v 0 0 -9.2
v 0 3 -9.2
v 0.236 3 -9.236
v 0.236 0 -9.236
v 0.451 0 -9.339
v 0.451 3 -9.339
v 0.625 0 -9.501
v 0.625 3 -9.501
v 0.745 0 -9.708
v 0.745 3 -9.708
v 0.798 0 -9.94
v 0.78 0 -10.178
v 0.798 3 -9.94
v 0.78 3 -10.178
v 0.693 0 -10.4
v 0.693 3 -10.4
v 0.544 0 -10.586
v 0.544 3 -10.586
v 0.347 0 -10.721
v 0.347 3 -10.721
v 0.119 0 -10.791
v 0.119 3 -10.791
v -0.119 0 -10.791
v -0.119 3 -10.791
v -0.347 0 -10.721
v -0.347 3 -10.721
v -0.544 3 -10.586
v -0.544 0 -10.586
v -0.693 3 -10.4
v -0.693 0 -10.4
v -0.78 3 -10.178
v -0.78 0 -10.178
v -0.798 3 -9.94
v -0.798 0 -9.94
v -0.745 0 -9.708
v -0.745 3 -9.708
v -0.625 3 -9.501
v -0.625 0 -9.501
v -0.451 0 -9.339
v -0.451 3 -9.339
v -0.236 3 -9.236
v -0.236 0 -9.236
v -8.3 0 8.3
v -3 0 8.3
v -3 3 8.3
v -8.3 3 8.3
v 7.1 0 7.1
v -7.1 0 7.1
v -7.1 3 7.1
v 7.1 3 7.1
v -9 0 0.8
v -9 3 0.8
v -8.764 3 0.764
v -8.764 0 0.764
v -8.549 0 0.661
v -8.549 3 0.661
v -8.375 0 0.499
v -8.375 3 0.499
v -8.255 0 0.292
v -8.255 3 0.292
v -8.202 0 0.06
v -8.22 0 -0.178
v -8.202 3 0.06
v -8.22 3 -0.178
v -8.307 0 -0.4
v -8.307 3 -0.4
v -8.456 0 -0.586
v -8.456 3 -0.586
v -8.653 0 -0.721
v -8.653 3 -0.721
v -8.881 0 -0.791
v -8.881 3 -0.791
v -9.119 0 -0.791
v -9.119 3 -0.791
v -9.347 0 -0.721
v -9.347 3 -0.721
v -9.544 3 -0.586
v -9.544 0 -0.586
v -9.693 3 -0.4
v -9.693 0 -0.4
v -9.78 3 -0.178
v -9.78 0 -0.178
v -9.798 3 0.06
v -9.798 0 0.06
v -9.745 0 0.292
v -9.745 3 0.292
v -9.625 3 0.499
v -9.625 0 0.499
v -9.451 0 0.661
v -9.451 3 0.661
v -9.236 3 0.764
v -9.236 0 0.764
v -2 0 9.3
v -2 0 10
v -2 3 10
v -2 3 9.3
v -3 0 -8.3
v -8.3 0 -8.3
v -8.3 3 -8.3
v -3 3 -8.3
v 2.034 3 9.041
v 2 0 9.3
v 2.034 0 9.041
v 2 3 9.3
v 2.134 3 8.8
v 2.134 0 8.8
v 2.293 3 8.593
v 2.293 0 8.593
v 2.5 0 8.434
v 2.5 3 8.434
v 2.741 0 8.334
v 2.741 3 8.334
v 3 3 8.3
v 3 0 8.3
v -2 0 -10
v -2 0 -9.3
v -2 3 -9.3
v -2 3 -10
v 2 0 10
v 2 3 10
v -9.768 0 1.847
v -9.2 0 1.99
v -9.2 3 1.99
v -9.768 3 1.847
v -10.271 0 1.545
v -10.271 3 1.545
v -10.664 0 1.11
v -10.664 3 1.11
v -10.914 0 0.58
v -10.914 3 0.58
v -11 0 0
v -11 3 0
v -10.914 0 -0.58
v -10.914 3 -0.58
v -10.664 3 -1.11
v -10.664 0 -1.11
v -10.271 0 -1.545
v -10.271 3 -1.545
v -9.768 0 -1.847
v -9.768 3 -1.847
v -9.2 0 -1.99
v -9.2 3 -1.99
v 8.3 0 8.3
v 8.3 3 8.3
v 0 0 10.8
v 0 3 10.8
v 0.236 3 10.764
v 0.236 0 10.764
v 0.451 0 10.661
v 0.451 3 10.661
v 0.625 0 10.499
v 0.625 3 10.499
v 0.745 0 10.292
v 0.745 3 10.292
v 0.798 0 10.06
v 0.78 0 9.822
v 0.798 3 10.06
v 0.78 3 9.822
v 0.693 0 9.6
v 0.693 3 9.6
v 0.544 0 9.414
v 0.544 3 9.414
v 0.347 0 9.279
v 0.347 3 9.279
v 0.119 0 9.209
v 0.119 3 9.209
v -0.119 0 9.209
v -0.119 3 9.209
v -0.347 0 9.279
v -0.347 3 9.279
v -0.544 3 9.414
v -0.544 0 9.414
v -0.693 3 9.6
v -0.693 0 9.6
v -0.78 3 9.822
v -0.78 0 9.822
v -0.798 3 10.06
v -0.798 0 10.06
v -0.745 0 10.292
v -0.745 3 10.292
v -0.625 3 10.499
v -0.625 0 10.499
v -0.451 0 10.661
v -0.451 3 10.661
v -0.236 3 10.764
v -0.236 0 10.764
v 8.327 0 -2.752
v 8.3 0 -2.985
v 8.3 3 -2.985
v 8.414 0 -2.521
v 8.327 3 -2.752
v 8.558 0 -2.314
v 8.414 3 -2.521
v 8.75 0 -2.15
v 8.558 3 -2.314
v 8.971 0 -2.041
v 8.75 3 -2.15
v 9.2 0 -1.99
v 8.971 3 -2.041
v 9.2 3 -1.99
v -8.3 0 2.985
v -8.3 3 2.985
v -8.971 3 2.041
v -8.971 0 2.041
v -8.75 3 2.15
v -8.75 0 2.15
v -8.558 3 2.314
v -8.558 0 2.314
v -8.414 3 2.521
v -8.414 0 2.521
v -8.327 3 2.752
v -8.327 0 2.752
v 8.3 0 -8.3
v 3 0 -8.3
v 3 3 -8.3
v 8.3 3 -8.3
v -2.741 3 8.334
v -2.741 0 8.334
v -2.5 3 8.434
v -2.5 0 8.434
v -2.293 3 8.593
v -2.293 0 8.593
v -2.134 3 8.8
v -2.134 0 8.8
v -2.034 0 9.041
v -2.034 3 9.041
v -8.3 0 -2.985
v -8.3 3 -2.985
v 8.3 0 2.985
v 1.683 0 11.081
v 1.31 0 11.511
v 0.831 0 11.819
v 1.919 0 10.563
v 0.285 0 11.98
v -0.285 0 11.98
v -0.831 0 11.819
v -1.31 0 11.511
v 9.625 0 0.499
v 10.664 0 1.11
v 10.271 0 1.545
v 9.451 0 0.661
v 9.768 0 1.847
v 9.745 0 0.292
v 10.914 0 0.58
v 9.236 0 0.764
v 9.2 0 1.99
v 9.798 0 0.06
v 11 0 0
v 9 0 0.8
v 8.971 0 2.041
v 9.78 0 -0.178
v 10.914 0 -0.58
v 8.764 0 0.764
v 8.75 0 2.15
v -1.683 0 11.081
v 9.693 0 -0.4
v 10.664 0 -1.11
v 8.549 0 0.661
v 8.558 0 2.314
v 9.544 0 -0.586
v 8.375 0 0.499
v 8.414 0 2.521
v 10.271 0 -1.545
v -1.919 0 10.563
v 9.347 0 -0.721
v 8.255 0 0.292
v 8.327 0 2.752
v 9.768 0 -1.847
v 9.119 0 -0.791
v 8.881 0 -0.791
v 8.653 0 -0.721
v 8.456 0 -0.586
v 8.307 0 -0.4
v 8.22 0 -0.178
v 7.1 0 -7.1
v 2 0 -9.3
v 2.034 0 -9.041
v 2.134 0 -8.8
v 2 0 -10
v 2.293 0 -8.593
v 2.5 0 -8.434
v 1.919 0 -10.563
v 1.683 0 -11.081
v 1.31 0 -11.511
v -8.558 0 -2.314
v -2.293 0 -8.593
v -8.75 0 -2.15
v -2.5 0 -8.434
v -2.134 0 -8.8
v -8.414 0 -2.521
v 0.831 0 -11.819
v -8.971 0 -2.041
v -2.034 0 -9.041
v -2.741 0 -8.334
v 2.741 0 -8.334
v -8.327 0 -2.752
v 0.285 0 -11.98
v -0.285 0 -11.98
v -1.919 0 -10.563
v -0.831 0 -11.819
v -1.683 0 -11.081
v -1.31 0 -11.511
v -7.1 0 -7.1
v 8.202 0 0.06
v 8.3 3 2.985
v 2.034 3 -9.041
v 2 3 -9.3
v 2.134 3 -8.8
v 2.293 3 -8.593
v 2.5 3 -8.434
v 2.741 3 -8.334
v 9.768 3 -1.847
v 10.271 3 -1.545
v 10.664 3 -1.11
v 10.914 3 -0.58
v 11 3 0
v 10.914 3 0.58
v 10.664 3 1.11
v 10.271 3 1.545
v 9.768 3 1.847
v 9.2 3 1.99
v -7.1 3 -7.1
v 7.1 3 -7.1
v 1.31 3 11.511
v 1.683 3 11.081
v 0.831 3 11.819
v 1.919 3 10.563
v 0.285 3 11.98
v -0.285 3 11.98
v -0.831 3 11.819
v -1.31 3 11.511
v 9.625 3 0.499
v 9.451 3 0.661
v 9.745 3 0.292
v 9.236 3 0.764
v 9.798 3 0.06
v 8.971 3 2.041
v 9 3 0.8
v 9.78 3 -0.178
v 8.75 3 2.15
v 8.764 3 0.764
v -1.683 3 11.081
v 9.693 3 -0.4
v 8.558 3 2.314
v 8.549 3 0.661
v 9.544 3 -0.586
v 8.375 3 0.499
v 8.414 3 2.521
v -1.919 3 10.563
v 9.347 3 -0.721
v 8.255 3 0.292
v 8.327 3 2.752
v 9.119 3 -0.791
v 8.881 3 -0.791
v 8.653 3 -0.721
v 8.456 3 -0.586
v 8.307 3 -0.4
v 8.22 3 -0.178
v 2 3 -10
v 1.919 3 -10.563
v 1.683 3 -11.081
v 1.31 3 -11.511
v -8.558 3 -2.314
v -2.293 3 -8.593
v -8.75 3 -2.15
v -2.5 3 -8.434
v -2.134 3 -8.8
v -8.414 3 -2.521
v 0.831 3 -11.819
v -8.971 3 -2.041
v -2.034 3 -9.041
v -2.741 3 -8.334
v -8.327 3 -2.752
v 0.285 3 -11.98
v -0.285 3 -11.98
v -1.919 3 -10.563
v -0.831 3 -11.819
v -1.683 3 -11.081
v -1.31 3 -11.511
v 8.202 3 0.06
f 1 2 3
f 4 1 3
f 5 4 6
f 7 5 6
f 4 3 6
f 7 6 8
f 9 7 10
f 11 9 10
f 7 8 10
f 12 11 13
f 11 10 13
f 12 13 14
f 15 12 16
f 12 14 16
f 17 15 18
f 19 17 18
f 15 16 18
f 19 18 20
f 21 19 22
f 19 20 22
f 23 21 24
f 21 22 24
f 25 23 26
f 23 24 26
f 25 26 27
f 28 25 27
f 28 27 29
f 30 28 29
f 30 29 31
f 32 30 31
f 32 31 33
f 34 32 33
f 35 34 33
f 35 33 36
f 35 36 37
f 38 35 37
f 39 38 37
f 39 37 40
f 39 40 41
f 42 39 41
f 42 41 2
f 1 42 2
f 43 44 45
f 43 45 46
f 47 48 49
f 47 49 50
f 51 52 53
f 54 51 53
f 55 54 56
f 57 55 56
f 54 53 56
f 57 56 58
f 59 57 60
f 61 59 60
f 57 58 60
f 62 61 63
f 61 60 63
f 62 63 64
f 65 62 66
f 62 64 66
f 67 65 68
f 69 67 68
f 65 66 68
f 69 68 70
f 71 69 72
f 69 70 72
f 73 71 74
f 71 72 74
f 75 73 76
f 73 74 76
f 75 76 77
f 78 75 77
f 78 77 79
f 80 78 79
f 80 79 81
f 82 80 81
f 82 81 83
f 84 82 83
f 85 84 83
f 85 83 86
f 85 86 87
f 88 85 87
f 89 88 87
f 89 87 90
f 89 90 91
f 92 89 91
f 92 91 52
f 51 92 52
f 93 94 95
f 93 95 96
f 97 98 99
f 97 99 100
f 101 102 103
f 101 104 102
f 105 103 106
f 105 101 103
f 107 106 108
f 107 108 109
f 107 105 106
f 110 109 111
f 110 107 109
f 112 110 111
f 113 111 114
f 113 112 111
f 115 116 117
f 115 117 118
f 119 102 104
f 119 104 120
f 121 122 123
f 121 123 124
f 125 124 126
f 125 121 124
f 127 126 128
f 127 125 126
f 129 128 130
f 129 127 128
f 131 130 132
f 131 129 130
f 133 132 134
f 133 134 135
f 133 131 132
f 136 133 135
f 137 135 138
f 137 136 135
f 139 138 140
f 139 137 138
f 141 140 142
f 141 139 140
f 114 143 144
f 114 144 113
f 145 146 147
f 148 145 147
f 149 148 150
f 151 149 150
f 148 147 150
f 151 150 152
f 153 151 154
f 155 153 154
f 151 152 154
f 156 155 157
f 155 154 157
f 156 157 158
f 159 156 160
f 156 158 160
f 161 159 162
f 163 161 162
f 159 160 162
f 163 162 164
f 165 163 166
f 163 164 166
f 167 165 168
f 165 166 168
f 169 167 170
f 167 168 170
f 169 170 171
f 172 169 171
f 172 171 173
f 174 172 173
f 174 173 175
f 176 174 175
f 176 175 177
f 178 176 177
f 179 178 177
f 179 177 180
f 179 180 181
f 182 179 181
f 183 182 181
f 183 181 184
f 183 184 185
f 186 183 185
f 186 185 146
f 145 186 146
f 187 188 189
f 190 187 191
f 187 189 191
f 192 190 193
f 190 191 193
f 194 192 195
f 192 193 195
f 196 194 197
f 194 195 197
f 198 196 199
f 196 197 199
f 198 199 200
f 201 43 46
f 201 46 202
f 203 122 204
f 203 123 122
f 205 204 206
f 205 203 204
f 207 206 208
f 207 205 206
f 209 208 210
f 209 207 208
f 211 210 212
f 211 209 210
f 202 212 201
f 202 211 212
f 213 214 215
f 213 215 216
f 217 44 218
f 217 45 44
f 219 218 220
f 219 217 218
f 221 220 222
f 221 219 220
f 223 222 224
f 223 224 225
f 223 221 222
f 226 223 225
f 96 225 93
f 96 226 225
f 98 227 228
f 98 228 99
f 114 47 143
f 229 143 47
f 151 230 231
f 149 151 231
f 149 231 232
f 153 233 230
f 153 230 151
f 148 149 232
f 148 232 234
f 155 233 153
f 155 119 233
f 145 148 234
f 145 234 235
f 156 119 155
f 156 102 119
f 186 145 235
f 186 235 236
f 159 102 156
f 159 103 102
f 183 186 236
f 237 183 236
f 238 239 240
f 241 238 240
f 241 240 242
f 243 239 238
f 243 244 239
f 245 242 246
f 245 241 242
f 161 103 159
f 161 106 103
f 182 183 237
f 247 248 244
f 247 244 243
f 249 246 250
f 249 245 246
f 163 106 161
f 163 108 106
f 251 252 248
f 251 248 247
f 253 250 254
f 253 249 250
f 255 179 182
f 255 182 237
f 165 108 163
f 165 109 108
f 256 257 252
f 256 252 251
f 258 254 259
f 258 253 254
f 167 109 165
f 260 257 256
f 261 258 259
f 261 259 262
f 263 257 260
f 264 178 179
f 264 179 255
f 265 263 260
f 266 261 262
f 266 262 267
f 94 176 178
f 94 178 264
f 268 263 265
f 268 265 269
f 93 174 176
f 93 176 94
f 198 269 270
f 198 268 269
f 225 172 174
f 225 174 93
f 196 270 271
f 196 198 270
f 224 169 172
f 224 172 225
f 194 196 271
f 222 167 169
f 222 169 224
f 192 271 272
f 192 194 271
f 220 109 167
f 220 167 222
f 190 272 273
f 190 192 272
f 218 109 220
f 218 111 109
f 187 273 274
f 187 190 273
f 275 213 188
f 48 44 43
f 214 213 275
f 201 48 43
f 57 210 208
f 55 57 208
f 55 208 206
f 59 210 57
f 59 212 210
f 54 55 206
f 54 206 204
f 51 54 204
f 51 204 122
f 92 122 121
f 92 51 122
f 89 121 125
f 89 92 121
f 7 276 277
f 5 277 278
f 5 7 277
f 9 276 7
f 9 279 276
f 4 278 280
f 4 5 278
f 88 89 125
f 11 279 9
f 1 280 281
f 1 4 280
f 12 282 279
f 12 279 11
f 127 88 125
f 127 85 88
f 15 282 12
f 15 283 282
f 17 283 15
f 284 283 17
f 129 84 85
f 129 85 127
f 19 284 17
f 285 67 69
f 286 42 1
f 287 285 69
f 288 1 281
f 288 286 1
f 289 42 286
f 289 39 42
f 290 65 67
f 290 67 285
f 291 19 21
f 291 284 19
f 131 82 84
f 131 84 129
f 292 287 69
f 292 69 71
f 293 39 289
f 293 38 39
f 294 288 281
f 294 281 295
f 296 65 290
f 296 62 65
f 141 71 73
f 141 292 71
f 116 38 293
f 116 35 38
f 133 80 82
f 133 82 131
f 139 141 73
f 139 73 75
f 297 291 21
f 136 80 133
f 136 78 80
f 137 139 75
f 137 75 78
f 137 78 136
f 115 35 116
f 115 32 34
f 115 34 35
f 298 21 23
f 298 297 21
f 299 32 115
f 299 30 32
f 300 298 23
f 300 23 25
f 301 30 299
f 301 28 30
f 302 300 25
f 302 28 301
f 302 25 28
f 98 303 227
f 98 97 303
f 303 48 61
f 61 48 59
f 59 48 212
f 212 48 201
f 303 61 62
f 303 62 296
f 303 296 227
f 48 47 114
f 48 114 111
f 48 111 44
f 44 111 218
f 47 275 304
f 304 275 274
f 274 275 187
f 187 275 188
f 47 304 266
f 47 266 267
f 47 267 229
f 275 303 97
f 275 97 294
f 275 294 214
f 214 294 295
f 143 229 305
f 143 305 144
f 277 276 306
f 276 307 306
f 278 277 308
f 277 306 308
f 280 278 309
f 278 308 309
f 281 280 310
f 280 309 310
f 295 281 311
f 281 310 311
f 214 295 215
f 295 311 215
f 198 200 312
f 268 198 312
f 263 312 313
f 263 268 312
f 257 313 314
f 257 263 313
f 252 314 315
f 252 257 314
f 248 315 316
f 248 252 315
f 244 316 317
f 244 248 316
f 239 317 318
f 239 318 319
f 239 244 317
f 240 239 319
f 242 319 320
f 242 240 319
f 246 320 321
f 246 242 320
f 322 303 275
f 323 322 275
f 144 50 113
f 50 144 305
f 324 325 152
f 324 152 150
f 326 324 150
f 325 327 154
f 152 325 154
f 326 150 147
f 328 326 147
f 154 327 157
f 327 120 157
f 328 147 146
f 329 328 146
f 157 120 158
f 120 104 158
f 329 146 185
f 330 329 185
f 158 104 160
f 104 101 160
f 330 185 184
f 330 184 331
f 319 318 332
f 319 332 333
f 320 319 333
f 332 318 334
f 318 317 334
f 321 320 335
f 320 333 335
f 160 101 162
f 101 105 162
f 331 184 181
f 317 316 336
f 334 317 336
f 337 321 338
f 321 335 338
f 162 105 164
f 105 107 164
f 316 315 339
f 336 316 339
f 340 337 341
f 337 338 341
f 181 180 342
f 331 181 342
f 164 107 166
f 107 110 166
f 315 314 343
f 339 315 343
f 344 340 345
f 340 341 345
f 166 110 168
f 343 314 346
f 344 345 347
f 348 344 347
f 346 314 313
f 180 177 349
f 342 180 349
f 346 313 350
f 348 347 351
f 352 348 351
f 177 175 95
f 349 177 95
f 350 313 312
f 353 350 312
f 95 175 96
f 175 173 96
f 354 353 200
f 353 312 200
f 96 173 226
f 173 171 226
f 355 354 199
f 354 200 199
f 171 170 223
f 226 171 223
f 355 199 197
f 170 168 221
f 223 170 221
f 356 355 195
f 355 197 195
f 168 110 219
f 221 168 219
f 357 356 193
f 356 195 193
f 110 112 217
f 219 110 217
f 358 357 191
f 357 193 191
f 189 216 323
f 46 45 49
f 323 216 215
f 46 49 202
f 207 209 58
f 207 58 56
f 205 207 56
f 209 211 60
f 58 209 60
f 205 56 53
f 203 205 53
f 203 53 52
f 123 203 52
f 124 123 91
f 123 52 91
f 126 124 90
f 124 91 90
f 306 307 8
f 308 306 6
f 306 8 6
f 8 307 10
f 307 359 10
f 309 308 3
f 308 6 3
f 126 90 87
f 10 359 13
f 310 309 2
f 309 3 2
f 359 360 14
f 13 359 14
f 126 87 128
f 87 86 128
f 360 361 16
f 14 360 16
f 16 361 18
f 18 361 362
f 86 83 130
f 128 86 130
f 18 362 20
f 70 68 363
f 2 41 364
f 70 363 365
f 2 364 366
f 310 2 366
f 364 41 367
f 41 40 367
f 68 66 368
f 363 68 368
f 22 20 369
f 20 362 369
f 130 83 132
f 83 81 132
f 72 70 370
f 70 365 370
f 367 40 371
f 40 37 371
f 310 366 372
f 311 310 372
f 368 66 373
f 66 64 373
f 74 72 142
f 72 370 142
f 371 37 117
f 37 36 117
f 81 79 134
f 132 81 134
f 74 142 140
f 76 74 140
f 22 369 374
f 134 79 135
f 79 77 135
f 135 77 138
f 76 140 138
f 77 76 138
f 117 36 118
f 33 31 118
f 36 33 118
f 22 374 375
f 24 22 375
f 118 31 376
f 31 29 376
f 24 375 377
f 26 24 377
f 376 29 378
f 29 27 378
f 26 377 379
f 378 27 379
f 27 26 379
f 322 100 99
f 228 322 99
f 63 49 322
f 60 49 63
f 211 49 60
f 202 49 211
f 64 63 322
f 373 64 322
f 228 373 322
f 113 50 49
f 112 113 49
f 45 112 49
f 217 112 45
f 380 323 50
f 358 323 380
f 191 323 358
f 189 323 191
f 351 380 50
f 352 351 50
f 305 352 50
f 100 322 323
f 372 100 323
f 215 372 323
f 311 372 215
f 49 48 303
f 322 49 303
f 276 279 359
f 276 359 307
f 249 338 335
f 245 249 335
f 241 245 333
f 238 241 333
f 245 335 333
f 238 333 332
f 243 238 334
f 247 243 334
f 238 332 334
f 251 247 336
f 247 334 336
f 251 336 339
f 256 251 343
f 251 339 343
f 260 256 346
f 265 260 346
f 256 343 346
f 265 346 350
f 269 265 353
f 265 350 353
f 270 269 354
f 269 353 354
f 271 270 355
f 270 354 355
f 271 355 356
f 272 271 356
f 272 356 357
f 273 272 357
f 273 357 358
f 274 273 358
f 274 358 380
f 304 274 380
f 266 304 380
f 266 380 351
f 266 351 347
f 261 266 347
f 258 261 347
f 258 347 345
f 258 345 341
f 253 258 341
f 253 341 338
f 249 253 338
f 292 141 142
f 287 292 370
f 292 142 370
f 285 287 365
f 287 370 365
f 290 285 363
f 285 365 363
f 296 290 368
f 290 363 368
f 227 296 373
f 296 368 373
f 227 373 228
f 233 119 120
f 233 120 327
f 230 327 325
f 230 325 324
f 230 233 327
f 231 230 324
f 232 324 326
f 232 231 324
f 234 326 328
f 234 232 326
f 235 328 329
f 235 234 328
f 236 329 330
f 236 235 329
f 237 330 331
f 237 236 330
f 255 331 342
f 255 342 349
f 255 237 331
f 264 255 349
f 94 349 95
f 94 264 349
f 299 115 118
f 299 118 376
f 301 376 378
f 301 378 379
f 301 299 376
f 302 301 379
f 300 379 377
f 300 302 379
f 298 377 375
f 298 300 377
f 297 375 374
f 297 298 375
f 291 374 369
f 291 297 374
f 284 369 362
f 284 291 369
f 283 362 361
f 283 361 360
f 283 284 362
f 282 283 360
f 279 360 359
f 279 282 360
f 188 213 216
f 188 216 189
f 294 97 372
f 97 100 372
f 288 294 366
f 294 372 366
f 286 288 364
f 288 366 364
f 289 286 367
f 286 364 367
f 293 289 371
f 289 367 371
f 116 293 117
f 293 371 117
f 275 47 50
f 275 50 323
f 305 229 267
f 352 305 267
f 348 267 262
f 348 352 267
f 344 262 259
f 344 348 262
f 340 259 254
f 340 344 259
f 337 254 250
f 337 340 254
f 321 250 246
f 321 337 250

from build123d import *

# Parameters (mm, degrees)
SKETCH1_W           = 14.2
SKETCH1_H           = 14.2
BOSS_EXTRUDE1_DEPTH = 3
SKETCH2_R           = 0.8
CUT_EXTRUDE1_DEPTH  = 17.552945357
FILLET1_R           = 1


with BuildPart() as part:
    # Sketch1 → Boss-Extrude1 (new body)
    with BuildSketch(Plane(origin=(0, 0, 0), x_dir=(1, 0, 0), z_dir=(0, 1, 0))):
        with BuildLine():
            Line((-9, 2), (-8.3, 2))
            Line((-8.3, 2), (-8.3, 8.3))
            Line((-8.3, 8.3), (-2, 8.3))
            Line((-2, 8.3), (-2, 10))
            ThreePointArc((-2, 10), (0, 12), (2, 10))
            Line((2, 10), (2, 8.3))
            Line((2, 8.3), (8.3, 8.3))
            Line((8.3, 8.3), (8.3, 2))
            Line((8.3, 2), (9, 2))
            ThreePointArc((9, 2), (11, 0), (9, -2))
            Line((9, -2), (8.3, -2))
            Line((8.3, -2), (8.3, -8.3))
            Line((8.3, -8.3), (2, -8.3))
            Line((2, -8.3), (2, -10))
            ThreePointArc((2, -10), (0, -12), (-2, -10))
            Line((-2, -10), (-2, -8.3))
            Line((-2, -8.3), (-8.3, -8.3))
            Line((-8.3, -8.3), (-8.3, -2))
            Line((-8.3, -2), (-9, -2))
            ThreePointArc((-9, -2), (-11, 0), (-9, 2))
        make_face()
        Rectangle(SKETCH1_W, SKETCH1_H, mode=Mode.SUBTRACT)
    extrude(amount=BOSS_EXTRUDE1_DEPTH)

    # Sketch2 → Cut-Extrude1 (cut, through all)
    with BuildSketch(Plane(origin=(0, 3, 0), x_dir=(1, 0, 0), z_dir=(0, 1, 0))):
        with Locations(Location((0, 10, 0), (0, 0, 270))):
            Circle(SKETCH2_R)
        with Locations(Location((9, 0, 0), (0, 0, 270))):
            Circle(SKETCH2_R)
        with Locations(Location((0, -10, 0), (0, 0, 270))):
            Circle(SKETCH2_R)
        with Locations(Location((-9, 0, 0), (0, 0, 270))):
            Circle(SKETCH2_R)
    extrude(amount=-CUT_EXTRUDE1_DEPTH, mode=Mode.SUBTRACT)

    # Fillet1
    fillet1_edges = [part.edges().sort_by_distance(p)[0] for p in [
        (-2, 1.5, 8.3),
        (2, 1.5, 8.3),
        (8.3, 1.5, 2),
        (8.3, 1.5, -2),
        (2, 1.5, -8.3),
        (-2, 1.5, -8.3),
        (-8.3, 1.5, -2),
        (-8.3, 1.5, 2),
    ]]
    fillet(fillet1_edges, radius=FILLET1_R)


solid = part.part
